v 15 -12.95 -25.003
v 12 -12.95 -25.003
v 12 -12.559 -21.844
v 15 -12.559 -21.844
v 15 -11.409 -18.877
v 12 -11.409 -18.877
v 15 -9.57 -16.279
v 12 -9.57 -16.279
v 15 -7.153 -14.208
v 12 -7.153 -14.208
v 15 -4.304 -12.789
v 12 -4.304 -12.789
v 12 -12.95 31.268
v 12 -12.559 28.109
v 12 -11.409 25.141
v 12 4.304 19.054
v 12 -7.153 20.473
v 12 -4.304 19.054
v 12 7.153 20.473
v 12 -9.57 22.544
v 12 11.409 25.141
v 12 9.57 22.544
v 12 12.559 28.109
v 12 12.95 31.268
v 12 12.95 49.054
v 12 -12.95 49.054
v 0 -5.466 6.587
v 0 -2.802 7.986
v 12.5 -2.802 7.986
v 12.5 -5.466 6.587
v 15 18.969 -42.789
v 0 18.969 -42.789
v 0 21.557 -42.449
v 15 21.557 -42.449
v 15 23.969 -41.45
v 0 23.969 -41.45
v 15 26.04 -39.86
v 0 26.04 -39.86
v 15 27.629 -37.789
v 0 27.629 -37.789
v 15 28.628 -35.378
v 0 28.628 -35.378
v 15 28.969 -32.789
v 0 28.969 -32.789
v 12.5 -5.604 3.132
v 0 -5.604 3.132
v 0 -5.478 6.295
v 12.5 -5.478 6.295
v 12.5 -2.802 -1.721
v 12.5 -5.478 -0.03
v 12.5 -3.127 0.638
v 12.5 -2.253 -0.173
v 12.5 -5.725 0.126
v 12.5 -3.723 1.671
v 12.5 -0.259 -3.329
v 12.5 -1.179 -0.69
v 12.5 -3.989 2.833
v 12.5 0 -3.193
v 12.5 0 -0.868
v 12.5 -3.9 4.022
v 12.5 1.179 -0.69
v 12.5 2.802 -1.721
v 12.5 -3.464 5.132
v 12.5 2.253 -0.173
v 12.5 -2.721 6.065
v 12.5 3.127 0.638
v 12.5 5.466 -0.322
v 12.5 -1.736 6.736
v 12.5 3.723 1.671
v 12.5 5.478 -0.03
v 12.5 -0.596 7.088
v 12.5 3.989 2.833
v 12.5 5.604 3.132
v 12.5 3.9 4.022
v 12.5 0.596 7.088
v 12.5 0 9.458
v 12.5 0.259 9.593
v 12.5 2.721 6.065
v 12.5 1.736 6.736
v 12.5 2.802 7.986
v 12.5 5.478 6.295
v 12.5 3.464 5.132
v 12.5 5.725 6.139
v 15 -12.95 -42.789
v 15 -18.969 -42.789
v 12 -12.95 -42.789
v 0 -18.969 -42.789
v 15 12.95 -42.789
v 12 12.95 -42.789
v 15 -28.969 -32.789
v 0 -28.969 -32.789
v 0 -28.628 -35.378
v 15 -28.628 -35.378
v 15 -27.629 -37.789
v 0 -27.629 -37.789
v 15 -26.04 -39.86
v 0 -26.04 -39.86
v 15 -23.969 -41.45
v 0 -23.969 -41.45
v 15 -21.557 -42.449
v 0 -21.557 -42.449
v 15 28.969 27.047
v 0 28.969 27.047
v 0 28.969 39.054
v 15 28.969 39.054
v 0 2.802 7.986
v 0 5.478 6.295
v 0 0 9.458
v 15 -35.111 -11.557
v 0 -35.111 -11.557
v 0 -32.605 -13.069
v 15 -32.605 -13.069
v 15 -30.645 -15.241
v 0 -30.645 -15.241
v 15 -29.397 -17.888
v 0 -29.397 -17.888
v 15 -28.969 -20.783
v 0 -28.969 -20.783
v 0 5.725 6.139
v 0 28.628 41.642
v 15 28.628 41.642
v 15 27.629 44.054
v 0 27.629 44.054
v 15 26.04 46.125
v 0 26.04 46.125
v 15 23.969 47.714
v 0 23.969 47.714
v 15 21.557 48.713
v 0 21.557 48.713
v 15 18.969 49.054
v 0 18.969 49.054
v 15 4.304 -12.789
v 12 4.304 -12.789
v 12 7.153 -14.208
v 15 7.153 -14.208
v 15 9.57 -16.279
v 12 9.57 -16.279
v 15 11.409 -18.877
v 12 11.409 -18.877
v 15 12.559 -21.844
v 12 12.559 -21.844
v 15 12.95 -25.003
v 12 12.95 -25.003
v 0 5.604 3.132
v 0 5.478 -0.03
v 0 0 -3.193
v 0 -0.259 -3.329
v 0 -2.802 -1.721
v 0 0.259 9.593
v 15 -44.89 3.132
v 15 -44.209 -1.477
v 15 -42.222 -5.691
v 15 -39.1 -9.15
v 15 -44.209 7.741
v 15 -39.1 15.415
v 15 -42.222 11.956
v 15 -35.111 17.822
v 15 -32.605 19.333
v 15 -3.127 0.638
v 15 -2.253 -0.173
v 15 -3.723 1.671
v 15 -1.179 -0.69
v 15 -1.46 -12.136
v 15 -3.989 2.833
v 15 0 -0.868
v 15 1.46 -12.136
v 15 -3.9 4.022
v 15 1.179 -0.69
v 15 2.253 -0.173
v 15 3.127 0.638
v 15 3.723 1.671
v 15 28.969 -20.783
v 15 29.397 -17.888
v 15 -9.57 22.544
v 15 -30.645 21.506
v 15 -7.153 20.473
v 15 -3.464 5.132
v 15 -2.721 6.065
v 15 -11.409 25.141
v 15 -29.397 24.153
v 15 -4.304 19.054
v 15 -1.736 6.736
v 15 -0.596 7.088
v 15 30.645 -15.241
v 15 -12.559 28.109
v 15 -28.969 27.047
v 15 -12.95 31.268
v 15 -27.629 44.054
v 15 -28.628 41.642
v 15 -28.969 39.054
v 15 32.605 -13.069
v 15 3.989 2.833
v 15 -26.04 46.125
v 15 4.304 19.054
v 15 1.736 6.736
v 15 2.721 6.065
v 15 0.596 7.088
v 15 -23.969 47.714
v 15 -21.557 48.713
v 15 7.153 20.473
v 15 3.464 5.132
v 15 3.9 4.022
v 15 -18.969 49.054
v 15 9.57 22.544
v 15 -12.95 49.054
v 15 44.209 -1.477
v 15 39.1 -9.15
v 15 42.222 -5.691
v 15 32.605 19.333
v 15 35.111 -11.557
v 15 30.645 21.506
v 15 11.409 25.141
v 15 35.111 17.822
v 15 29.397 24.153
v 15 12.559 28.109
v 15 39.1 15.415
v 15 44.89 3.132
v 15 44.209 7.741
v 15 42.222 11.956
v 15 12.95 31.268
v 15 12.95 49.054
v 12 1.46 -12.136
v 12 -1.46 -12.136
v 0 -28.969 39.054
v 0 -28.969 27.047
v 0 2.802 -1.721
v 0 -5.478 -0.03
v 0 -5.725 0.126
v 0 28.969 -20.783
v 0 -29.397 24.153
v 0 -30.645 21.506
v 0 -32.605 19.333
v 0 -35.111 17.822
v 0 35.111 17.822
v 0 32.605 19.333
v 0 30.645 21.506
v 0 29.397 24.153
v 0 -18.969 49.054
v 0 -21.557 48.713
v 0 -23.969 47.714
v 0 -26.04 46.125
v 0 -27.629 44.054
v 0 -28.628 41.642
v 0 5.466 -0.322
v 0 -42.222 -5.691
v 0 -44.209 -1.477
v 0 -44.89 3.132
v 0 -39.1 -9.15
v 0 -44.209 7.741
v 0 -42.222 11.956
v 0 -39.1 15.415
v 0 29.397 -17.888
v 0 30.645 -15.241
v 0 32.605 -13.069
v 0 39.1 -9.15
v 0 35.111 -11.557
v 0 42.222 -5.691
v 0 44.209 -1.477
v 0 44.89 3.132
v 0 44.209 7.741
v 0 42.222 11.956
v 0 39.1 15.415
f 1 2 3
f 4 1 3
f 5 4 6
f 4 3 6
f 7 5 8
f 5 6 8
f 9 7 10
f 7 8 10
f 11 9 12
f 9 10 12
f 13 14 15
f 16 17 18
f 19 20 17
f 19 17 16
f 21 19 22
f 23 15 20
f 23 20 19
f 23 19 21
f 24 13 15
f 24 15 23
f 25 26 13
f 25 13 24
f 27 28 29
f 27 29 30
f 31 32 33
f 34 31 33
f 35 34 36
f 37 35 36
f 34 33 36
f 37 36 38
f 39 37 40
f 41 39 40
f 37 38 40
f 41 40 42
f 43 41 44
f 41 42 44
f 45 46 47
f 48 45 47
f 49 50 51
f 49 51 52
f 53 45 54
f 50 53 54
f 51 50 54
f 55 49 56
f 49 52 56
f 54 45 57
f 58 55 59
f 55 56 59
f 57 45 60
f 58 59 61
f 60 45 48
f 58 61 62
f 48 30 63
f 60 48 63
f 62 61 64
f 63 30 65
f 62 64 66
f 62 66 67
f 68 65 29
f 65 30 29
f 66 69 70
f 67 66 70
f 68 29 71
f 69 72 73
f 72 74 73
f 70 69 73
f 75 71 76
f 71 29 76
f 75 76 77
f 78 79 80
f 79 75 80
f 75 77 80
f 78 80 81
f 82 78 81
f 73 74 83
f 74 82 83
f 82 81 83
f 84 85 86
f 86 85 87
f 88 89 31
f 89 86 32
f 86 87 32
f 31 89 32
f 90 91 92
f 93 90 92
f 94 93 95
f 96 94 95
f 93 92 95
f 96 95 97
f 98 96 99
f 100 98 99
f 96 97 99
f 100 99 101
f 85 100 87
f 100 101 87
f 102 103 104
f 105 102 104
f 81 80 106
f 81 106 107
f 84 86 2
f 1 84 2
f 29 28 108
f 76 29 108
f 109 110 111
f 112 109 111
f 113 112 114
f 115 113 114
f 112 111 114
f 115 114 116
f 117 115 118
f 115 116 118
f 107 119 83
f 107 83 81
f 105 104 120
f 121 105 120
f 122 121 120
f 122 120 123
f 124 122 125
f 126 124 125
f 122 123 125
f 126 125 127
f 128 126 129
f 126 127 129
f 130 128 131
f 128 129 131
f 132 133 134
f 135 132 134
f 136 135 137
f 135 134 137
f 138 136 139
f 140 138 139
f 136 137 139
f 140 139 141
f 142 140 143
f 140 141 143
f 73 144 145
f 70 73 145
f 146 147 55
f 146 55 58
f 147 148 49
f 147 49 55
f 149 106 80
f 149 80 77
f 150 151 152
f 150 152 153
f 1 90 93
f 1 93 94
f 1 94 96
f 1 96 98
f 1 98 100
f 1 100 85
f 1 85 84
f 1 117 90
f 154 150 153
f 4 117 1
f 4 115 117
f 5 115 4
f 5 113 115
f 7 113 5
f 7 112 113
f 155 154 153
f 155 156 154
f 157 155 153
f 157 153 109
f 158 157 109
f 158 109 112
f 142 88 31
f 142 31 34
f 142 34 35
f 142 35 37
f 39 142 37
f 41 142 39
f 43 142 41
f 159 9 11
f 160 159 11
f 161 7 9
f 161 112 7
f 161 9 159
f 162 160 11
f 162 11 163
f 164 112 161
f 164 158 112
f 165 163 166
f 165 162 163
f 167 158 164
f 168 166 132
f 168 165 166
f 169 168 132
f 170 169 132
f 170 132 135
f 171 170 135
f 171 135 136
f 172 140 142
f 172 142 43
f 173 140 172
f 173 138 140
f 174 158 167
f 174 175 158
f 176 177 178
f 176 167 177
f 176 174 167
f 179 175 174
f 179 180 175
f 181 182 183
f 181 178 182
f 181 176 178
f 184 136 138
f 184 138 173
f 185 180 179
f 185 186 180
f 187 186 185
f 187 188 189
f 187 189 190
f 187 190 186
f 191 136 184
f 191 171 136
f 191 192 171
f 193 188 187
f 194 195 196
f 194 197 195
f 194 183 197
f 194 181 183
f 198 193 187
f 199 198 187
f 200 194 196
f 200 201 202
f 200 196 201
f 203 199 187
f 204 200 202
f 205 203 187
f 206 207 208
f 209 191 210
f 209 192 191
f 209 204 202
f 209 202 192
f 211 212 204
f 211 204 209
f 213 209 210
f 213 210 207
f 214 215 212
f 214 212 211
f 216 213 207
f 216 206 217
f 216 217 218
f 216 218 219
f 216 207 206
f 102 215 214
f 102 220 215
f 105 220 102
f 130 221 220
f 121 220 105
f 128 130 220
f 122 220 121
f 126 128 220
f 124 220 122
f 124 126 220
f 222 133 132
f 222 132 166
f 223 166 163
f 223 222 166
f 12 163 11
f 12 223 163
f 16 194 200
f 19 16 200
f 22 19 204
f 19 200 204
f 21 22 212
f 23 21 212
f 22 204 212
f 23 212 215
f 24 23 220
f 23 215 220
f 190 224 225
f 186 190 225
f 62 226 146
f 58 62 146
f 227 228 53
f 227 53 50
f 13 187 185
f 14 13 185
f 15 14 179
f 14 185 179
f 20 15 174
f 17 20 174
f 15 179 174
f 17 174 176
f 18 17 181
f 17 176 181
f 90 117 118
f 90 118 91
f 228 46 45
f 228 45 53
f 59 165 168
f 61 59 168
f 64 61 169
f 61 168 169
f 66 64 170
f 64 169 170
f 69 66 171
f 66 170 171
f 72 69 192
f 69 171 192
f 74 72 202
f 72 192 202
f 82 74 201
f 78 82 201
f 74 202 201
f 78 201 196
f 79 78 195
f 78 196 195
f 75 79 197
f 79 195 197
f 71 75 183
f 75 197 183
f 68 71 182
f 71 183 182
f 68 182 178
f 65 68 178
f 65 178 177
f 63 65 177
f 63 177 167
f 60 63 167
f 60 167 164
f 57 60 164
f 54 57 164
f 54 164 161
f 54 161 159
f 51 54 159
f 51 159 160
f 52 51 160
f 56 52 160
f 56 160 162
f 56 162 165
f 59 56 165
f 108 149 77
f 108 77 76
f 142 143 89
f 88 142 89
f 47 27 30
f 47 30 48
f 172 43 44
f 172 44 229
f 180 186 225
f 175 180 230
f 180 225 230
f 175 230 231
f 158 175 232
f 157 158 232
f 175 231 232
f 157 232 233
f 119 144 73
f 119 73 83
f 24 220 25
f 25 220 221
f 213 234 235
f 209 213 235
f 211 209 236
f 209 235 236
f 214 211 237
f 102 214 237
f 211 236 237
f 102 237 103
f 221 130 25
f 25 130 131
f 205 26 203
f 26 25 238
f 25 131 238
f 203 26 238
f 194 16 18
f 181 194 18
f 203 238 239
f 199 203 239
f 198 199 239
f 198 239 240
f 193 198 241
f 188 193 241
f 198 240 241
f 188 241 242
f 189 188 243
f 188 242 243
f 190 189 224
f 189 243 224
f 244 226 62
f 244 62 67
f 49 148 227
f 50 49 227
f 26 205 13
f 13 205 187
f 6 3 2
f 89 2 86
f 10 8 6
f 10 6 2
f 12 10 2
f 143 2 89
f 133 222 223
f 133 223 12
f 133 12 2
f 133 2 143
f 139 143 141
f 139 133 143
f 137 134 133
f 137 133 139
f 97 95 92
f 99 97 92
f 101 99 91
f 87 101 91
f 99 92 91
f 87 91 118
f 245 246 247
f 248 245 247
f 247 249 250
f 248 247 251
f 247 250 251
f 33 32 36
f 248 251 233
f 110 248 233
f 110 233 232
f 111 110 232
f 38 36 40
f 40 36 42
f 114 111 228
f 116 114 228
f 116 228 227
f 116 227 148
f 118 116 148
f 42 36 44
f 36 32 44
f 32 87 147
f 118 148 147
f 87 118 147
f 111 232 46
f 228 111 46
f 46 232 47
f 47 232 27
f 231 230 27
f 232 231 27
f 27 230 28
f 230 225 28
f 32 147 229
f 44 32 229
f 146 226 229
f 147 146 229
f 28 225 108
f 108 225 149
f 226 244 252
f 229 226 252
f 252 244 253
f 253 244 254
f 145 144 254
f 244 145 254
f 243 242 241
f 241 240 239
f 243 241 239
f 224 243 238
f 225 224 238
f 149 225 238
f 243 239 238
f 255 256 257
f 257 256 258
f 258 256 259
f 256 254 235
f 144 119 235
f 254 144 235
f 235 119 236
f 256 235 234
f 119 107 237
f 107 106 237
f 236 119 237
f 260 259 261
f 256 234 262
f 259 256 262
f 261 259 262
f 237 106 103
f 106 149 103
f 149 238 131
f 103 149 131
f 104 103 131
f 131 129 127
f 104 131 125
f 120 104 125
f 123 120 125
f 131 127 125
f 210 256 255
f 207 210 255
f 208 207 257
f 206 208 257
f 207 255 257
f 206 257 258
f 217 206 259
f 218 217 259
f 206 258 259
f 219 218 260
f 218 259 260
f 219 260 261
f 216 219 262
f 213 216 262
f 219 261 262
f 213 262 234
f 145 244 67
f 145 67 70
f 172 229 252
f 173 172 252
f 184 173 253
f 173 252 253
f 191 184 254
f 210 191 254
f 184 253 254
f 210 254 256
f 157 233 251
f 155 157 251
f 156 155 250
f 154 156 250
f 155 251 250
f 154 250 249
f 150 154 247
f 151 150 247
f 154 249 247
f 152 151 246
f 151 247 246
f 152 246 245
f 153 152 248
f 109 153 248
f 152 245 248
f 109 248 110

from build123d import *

# Parameters (mm, degrees)
BOSS_EXTRUDE3_DEPTH = 15
SKETCH3_R           = 4
CUT_EXTRUDE3_DEPTH  = 14.0462
CUT_EXTRUDE4_DEPTH  = 3
CUT_EXTRUDE5_START  = -15
CUT_EXTRUDE5_DEPTH  = 12.5
MIRROR1_DEPTH       = 12.5
MIRROR1_START       = 12
MIRROR1_2_DEPTH     = 3
MIRROR1_3_DEPTH     = 12
MIRROR1_4_DEPTH     = 3


# Read off the part's stored shape, not the designer's step: Mirror1
with BuildPart() as part:
    # Sketch1 → Boss-Extrude3 (new body)
    with BuildSketch(Plane.YZ):
        with BuildLine():
            Line((-28.968617751, -12.789334175), (28.968617751, -12.789334175))
            ThreePointArc((28.968617751, -12.789334175), (44.579120821, 0), (35.110840206, 17.821518929))
            ThreePointArc((35.110840206, 17.821518929), (30.644623053, 21.505675602), (28.968617751, 27.047436358))
            Line((28.968617751, 27.047436358), (28.968617751, 39.053986921))
            ThreePointArc((28.968617751, 39.053986921), (26.039685563, 46.125054733), (18.968617751, 49.053986921))
            Line((18.968617751, 49.053986921), (-18.968617751, 49.053986921))
            ThreePointArc((-18.968617751, 49.053986921), (-26.039685563, 46.125054733), (-28.968617751, 39.053986921))
            Line((-28.968617751, 39.053986921), (-28.968617751, 27.047436358))
            ThreePointArc((-28.968617751, 27.047436358), (-30.644623053, 21.505675602), (-35.110840206, 17.821518929))
            ThreePointArc((-35.110840206, 17.821518929), (-44.579120821, 0), (-28.968617751, -12.789334175))
        make_face()
    extrude(amount=BOSS_EXTRUDE3_DEPTH)

    # Sketch3 → Cut-Extrude3 (cut)
    with BuildSketch(Plane.YZ.offset(15)):
        with Locations(Location((0, 3.132326373, 0), (0, 0, 270))):
            Circle(SKETCH3_R)
    extrude(amount=-CUT_EXTRUDE3_DEPTH, mode=Mode.SUBTRACT)

    # Sketch4 → Cut-Extrude4 (cut)
    with BuildSketch(Plane.YZ.offset(15)):
        with BuildLine():
            Line((-12.95, 49.053986921), (-12.95, 31.267703884))
            ThreePointArc((-12.95, 31.267703884), (0, 18.317703884), (12.95, 31.267703884))
            Line((12.95, 31.267703884), (12.95, 49.053986921))
            Line((12.95, 49.053986921), (-12.95, 49.053986921))
        make_face()
    extrude(amount=-CUT_EXTRUDE4_DEPTH, mode=Mode.SUBTRACT)

    # Sketch5 → Cut-Extrude5 (cut, symmetric)
    with BuildSketch(Plane.YZ.offset(15).offset(CUT_EXTRUDE5_START)):
        Polygon((5.466157569, 6.586954394), (-0.258716842, 9.5934717), (-5.724874411, 6.138843679), (-5.466157569, -0.322301647), (0.258716842, -3.328818953), (5.724874411, 0.125809067), align=None)
    extrude(amount=CUT_EXTRUDE5_DEPTH, both=True, mode=Mode.SUBTRACT)

    # Mirror1 outline → Mirror1 (cut)
    with BuildSketch(Plane.YZ):
        Polygon((-2.802243807, -1.721302263), (-0.258716842, -3.328818953), (0, -3.192949306), align=None)
        Polygon((-5.724874411, 0.125809067), (-5.477849424, -0.030311467), (-5.604487603, 3.132326373), align=None)
        Polygon((5.477849424, -0.030311467), (2.802243807, -1.721302263), (5.466157569, -0.322301647), align=None)
        Polygon((-5.466157569, 6.586954394), (-5.477849424, 6.294964213), (-2.802243802, 7.985955012), align=None)
        Polygon((5.477849424, 6.294964213), (5.604487603, 3.132326373), (5.724874411, 6.138843679), align=None)
        Polygon((0.258716842, 9.5934717), (0, 9.457602053), (2.802243802, 7.985955012), align=None)
    extrude(amount=MIRROR1_DEPTH, mode=Mode.SUBTRACT)

    # Mirror1 2 outline → Mirror1 2 (cut)
    with BuildSketch(Plane.YZ.offset(MIRROR1_START)):
        with BuildLine():
            ThreePointArc((4.30437196, -12.789334175), (0, -12.053051137), (-4.30437196, -12.789334175))
            Line((-4.30437196, -12.789334175), (4.30437196, -12.789334175))
        make_face()
    extrude(amount=MIRROR1_2_DEPTH, mode=Mode.SUBTRACT)

    # Mirror1 3 outline → Mirror1 3 (add)
    with BuildSketch(Plane.YZ):
        with BuildLine():
            ThreePointArc((-28.968617751, -32.789334175), (-26.039685563, -39.860401987), (-18.968617751, -42.789334175))
            Line((-18.968617751, -42.789334175), (18.968617751, -42.789334175))
            ThreePointArc((18.968617751, -42.789334175), (26.039685563, -39.860401987), (28.968617751, -32.789334175))
            Line((28.968617751, -32.789334175), (28.968617751, -20.782783611))
            ThreePointArc((28.968617751, -20.782783611), (30.644623053, -15.241022855), (35.110840206, -11.556866182))
            ThreePointArc((35.110840206, -11.556866182), (32.100944124, -12.478176697), (28.968617751, -12.789334175))
            Line((28.968617751, -12.789334175), (-28.968617751, -12.789334175))
            ThreePointArc((-28.968617751, -12.789334175), (-32.100944124, -12.478176697), (-35.110840206, -11.556866182))
            ThreePointArc((-35.110840206, -11.556866182), (-30.644623053, -15.241022855), (-28.968617751, -20.782783611))
            Line((-28.968617751, -20.782783611), (-28.968617751, -32.789334175))
        make_face()
        Polygon((-5.466157569, -0.322301647), (-2.802243807, -1.721302263), (-5.477849424, -0.030311467), align=None)
        Polygon((2.802243807, -1.721302263), (0, -3.192949306), (0.258716842, -3.328818953), align=None)
        Polygon((-5.724874411, 6.138843679), (-5.604487603, 3.132326373), (-5.477849424, 6.294964213), align=None)
        Polygon((5.604487603, 3.132326373), (5.477849424, -0.030311467), (5.724874411, 0.125809067), align=None)
        Polygon((-0.258716842, 9.5934717), (-2.802243802, 7.985955012), (0, 9.457602053), align=None)
        Polygon((2.802243802, 7.985955012), (5.477849424, 6.294964213), (5.466157569, 6.586954394), align=None)
    extrude(amount=MIRROR1_3_DEPTH)

    # Mirror1 4 outline → Mirror1 4 (add)
    with BuildSketch(Plane.YZ.offset(MIRROR1_START)):
        with BuildLine():
            ThreePointArc((-28.968617751, -32.789334175), (-26.039685563, -39.860401987), (-18.968617751, -42.789334175))
            Line((-18.968617751, -42.789334175), (-12.95, -42.789334175))
            Line((-12.95, -42.789334175), (-12.95, -25.003051137))
            ThreePointArc((-12.95, -25.003051137), (-10.569865583, -17.521043281), (-4.30437196, -12.789334175))
            Line((-4.30437196, -12.789334175), (-28.968617751, -12.789334175))
            ThreePointArc((-28.968617751, -12.789334175), (-32.100944124, -12.478176697), (-35.110840206, -11.556866182))
            ThreePointArc((-35.110840206, -11.556866182), (-30.644623053, -15.241022855), (-28.968617751, -20.782783611))
            Line((-28.968617751, -20.782783611), (-28.968617751, -32.789334175))
        make_face()
        with BuildLine():
            Line((12.95, -25.003051137), (12.95, -42.789334175))
            Line((12.95, -42.789334175), (18.968617751, -42.789334175))
            ThreePointArc((18.968617751, -42.789334175), (26.039685563, -39.860401987), (28.968617751, -32.789334175))
            Line((28.968617751, -32.789334175), (28.968617751, -20.782783611))
            ThreePointArc((28.968617751, -20.782783611), (30.644623053, -15.241022855), (35.110840206, -11.556866182))
            ThreePointArc((35.110840206, -11.556866182), (32.100944124, -12.478176697), (28.968617751, -12.789334175))
            Line((28.968617751, -12.789334175), (4.30437196, -12.789334175))
            ThreePointArc((4.30437196, -12.789334175), (10.569865583, -17.521043281), (12.95, -25.003051137))
        make_face()
        with BuildLine():
            ThreePointArc((-4.304371959, 19.053986921), (0, 18.317703884), (4.304371959, 19.053986921))
            Line((4.304371959, 19.053986921), (-4.304371959, 19.053986921))
        make_face()
        Polygon((-5.466157569, -0.322301647), (-2.802243807, -1.721302263), (-5.477849424, -0.030311467), align=None)
        Polygon((2.802243807, -1.721302263), (0, -3.192949306), (0.258716842, -3.328818953), align=None)
        Polygon((-5.724874411, 6.138843679), (-5.604487603, 3.132326373), (-5.477849424, 6.294964213), align=None)
        Polygon((5.604487603, 3.132326373), (5.477849424, -0.030311467), (5.724874411, 0.125809067), align=None)
        Polygon((-0.258716842, 9.5934717), (-2.802243802, 7.985955012), (0, 9.457602053), align=None)
        Polygon((2.802243802, 7.985955012), (5.477849424, 6.294964213), (5.466157569, 6.586954394), align=None)
    extrude(amount=MIRROR1_4_DEPTH)


solid = part.part
